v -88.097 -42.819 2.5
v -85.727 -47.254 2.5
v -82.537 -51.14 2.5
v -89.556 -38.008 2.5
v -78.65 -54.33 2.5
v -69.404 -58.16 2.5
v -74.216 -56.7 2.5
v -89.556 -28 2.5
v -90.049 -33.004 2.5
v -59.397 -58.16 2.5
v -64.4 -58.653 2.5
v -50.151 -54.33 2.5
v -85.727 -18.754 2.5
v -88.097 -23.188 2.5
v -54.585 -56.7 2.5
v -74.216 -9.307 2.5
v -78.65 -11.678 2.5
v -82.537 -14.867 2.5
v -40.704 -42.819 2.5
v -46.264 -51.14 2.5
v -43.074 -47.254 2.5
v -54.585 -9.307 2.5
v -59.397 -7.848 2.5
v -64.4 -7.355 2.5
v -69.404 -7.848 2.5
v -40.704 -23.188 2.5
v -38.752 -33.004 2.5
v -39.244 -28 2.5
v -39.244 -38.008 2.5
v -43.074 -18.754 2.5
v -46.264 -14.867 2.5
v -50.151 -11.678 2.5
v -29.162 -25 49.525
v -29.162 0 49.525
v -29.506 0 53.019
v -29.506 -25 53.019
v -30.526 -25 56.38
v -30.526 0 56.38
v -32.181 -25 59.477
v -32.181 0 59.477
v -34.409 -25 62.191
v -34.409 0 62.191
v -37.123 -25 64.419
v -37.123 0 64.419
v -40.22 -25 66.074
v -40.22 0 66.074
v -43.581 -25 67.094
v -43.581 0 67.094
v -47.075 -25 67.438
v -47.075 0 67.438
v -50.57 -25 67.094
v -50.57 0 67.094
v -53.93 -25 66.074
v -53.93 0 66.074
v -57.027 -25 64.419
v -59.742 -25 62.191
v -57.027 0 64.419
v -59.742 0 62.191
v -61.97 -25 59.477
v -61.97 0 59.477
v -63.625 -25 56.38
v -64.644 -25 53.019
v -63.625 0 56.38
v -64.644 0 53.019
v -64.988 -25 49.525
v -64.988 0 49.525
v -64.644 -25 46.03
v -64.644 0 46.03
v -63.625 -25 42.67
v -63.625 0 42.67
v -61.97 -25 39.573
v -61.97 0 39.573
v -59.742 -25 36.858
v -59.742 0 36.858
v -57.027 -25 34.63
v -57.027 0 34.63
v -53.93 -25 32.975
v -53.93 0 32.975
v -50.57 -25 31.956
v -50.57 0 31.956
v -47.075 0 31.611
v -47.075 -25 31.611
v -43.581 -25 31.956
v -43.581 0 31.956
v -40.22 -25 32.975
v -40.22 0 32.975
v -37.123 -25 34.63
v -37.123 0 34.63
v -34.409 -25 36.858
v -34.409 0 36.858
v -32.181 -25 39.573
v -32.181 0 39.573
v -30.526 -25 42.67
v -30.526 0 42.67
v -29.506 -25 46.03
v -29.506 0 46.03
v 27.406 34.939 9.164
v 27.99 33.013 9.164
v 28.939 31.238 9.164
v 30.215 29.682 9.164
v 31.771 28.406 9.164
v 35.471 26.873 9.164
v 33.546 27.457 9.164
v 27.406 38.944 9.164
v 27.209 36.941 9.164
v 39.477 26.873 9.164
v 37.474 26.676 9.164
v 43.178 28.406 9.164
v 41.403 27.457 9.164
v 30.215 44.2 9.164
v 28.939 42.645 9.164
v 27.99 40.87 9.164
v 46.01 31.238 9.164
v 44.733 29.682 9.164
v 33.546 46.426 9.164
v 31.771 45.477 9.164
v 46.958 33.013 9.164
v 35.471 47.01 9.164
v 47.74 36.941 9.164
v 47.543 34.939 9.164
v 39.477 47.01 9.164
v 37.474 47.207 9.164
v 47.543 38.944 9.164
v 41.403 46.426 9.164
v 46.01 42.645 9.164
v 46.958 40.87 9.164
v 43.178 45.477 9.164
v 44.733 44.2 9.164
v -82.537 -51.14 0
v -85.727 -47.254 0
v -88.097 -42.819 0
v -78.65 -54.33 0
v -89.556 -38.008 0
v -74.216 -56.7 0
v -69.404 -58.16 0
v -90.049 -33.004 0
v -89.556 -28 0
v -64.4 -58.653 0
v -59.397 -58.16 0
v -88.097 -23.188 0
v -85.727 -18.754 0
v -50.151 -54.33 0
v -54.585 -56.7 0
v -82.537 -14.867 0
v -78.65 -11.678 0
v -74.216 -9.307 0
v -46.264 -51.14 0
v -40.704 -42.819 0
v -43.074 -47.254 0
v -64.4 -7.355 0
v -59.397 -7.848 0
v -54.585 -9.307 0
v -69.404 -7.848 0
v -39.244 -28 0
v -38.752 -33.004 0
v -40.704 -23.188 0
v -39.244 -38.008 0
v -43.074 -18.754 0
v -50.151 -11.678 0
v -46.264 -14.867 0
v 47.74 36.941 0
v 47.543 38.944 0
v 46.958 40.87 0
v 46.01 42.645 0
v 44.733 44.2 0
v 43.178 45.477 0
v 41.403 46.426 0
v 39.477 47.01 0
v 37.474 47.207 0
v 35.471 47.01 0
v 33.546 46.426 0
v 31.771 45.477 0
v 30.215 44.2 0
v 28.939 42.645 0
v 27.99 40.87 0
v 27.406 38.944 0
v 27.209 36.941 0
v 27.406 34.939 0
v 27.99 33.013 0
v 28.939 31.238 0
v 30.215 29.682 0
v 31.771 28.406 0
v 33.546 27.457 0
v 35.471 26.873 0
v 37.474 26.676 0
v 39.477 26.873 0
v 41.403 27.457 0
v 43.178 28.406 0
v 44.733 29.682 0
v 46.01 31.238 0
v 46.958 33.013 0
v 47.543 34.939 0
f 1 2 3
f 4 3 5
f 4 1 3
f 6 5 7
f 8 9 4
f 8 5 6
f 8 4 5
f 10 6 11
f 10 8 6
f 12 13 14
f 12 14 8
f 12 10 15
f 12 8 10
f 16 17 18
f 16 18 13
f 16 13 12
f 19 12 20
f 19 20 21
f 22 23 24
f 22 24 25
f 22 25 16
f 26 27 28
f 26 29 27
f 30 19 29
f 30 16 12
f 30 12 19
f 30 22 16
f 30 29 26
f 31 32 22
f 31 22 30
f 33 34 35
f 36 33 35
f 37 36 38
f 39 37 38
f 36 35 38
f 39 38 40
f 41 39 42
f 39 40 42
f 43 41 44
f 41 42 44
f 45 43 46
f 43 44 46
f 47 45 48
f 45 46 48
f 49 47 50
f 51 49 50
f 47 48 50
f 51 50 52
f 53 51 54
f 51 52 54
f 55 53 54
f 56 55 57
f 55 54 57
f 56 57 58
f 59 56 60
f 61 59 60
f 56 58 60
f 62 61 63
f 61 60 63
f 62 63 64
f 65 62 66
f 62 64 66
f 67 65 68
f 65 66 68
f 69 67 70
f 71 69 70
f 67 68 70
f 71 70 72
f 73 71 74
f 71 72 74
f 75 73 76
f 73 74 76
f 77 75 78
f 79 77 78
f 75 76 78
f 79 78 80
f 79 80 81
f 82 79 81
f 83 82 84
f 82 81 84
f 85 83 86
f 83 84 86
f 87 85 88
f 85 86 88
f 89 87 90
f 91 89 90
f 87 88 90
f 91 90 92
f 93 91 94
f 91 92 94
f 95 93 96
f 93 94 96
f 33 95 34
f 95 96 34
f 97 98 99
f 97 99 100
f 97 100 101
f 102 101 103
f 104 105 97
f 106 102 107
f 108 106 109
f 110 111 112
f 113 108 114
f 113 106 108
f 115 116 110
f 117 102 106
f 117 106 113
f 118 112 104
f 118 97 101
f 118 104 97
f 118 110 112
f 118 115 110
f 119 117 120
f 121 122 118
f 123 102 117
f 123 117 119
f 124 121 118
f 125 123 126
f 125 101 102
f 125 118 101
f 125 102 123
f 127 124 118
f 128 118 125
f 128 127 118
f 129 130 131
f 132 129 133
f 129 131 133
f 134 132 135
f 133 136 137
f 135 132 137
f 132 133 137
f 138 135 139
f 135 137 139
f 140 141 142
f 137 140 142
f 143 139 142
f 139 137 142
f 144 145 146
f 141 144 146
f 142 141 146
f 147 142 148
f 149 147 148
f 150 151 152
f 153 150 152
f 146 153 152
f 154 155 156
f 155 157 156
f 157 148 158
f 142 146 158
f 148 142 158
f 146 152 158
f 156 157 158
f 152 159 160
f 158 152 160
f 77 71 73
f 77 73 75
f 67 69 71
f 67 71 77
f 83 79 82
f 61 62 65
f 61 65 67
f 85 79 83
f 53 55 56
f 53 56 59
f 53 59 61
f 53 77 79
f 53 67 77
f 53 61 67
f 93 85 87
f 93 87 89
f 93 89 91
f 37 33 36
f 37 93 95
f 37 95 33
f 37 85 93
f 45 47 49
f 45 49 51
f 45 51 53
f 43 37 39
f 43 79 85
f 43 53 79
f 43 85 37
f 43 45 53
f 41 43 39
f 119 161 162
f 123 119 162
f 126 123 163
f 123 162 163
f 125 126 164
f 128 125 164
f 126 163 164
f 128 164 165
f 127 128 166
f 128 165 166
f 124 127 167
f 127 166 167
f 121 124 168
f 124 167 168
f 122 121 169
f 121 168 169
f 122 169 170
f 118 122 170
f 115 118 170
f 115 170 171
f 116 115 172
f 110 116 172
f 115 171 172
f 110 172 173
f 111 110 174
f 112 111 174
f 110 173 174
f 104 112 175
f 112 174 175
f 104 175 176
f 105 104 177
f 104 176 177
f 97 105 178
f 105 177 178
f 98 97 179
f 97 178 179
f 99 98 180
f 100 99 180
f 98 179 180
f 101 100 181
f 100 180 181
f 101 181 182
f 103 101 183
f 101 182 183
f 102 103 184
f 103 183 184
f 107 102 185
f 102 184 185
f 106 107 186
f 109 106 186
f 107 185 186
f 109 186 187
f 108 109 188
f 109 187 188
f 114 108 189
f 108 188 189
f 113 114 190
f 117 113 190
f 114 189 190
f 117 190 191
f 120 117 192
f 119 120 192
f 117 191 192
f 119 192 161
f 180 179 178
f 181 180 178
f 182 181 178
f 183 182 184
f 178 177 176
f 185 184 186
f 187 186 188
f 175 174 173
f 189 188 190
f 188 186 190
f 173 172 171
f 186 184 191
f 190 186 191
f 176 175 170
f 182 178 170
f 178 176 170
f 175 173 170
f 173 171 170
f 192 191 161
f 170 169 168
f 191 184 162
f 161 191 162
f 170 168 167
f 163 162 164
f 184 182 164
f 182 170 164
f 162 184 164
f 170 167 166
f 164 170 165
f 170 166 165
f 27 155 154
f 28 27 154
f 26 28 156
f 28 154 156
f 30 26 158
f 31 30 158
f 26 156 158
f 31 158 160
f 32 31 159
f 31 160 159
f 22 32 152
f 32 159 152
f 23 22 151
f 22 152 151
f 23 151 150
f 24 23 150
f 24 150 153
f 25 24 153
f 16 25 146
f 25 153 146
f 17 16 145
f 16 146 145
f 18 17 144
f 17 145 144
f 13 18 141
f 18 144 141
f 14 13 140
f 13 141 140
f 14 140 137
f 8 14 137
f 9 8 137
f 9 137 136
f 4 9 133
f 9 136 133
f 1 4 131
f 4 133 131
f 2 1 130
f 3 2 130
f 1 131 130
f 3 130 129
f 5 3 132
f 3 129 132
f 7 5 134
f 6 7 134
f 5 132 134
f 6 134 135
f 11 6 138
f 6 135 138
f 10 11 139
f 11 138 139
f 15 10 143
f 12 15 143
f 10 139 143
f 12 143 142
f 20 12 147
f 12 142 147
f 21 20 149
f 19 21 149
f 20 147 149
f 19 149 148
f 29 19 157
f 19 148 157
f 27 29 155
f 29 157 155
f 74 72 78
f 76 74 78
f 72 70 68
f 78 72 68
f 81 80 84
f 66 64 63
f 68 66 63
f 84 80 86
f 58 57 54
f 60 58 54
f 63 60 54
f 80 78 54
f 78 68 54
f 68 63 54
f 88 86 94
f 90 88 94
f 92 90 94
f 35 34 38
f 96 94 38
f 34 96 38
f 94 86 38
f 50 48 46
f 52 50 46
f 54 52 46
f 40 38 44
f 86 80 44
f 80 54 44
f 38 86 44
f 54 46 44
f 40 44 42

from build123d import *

# Parameters (mm, degrees)
F0_R     = 10.2656995883
F1_DEPTH = 9.1642085463
F2_R     = 25.6488599295
F3_DEPTH = 2.5
F4_R     = 17.9131946883
F5_DEPTH = 25


# Not quite as in the source:
# - the program builds the solid bodies; features that only make, move or delete a surface that nothing else refers to are left out


with BuildPart() as f1:
    # F0 (on Top) → F1 (new body)
    with BuildSketch(Plane.XY):
        with Locations((37.4742150307, 36.9413942099)):
            Circle(F0_R)
    extrude(amount=F1_DEPTH)


with BuildPart() as f3:
    # F2 (on Top) → F3 (new body)
    with BuildSketch(Plane.XY):
        with Locations((-64.4004046917, -33.0038070679)):
            Circle(F2_R)
    extrude(amount=F3_DEPTH)


with BuildPart() as f5:
    # F4 (on Front) → F5 (new body)
    with BuildSketch(Plane.XZ):
        with Locations((-47.0752343535, 49.5246499777)):
            Circle(F4_R)
    extrude(amount=F5_DEPTH)


solid = Compound([f1.part, f3.part, f5.part])
